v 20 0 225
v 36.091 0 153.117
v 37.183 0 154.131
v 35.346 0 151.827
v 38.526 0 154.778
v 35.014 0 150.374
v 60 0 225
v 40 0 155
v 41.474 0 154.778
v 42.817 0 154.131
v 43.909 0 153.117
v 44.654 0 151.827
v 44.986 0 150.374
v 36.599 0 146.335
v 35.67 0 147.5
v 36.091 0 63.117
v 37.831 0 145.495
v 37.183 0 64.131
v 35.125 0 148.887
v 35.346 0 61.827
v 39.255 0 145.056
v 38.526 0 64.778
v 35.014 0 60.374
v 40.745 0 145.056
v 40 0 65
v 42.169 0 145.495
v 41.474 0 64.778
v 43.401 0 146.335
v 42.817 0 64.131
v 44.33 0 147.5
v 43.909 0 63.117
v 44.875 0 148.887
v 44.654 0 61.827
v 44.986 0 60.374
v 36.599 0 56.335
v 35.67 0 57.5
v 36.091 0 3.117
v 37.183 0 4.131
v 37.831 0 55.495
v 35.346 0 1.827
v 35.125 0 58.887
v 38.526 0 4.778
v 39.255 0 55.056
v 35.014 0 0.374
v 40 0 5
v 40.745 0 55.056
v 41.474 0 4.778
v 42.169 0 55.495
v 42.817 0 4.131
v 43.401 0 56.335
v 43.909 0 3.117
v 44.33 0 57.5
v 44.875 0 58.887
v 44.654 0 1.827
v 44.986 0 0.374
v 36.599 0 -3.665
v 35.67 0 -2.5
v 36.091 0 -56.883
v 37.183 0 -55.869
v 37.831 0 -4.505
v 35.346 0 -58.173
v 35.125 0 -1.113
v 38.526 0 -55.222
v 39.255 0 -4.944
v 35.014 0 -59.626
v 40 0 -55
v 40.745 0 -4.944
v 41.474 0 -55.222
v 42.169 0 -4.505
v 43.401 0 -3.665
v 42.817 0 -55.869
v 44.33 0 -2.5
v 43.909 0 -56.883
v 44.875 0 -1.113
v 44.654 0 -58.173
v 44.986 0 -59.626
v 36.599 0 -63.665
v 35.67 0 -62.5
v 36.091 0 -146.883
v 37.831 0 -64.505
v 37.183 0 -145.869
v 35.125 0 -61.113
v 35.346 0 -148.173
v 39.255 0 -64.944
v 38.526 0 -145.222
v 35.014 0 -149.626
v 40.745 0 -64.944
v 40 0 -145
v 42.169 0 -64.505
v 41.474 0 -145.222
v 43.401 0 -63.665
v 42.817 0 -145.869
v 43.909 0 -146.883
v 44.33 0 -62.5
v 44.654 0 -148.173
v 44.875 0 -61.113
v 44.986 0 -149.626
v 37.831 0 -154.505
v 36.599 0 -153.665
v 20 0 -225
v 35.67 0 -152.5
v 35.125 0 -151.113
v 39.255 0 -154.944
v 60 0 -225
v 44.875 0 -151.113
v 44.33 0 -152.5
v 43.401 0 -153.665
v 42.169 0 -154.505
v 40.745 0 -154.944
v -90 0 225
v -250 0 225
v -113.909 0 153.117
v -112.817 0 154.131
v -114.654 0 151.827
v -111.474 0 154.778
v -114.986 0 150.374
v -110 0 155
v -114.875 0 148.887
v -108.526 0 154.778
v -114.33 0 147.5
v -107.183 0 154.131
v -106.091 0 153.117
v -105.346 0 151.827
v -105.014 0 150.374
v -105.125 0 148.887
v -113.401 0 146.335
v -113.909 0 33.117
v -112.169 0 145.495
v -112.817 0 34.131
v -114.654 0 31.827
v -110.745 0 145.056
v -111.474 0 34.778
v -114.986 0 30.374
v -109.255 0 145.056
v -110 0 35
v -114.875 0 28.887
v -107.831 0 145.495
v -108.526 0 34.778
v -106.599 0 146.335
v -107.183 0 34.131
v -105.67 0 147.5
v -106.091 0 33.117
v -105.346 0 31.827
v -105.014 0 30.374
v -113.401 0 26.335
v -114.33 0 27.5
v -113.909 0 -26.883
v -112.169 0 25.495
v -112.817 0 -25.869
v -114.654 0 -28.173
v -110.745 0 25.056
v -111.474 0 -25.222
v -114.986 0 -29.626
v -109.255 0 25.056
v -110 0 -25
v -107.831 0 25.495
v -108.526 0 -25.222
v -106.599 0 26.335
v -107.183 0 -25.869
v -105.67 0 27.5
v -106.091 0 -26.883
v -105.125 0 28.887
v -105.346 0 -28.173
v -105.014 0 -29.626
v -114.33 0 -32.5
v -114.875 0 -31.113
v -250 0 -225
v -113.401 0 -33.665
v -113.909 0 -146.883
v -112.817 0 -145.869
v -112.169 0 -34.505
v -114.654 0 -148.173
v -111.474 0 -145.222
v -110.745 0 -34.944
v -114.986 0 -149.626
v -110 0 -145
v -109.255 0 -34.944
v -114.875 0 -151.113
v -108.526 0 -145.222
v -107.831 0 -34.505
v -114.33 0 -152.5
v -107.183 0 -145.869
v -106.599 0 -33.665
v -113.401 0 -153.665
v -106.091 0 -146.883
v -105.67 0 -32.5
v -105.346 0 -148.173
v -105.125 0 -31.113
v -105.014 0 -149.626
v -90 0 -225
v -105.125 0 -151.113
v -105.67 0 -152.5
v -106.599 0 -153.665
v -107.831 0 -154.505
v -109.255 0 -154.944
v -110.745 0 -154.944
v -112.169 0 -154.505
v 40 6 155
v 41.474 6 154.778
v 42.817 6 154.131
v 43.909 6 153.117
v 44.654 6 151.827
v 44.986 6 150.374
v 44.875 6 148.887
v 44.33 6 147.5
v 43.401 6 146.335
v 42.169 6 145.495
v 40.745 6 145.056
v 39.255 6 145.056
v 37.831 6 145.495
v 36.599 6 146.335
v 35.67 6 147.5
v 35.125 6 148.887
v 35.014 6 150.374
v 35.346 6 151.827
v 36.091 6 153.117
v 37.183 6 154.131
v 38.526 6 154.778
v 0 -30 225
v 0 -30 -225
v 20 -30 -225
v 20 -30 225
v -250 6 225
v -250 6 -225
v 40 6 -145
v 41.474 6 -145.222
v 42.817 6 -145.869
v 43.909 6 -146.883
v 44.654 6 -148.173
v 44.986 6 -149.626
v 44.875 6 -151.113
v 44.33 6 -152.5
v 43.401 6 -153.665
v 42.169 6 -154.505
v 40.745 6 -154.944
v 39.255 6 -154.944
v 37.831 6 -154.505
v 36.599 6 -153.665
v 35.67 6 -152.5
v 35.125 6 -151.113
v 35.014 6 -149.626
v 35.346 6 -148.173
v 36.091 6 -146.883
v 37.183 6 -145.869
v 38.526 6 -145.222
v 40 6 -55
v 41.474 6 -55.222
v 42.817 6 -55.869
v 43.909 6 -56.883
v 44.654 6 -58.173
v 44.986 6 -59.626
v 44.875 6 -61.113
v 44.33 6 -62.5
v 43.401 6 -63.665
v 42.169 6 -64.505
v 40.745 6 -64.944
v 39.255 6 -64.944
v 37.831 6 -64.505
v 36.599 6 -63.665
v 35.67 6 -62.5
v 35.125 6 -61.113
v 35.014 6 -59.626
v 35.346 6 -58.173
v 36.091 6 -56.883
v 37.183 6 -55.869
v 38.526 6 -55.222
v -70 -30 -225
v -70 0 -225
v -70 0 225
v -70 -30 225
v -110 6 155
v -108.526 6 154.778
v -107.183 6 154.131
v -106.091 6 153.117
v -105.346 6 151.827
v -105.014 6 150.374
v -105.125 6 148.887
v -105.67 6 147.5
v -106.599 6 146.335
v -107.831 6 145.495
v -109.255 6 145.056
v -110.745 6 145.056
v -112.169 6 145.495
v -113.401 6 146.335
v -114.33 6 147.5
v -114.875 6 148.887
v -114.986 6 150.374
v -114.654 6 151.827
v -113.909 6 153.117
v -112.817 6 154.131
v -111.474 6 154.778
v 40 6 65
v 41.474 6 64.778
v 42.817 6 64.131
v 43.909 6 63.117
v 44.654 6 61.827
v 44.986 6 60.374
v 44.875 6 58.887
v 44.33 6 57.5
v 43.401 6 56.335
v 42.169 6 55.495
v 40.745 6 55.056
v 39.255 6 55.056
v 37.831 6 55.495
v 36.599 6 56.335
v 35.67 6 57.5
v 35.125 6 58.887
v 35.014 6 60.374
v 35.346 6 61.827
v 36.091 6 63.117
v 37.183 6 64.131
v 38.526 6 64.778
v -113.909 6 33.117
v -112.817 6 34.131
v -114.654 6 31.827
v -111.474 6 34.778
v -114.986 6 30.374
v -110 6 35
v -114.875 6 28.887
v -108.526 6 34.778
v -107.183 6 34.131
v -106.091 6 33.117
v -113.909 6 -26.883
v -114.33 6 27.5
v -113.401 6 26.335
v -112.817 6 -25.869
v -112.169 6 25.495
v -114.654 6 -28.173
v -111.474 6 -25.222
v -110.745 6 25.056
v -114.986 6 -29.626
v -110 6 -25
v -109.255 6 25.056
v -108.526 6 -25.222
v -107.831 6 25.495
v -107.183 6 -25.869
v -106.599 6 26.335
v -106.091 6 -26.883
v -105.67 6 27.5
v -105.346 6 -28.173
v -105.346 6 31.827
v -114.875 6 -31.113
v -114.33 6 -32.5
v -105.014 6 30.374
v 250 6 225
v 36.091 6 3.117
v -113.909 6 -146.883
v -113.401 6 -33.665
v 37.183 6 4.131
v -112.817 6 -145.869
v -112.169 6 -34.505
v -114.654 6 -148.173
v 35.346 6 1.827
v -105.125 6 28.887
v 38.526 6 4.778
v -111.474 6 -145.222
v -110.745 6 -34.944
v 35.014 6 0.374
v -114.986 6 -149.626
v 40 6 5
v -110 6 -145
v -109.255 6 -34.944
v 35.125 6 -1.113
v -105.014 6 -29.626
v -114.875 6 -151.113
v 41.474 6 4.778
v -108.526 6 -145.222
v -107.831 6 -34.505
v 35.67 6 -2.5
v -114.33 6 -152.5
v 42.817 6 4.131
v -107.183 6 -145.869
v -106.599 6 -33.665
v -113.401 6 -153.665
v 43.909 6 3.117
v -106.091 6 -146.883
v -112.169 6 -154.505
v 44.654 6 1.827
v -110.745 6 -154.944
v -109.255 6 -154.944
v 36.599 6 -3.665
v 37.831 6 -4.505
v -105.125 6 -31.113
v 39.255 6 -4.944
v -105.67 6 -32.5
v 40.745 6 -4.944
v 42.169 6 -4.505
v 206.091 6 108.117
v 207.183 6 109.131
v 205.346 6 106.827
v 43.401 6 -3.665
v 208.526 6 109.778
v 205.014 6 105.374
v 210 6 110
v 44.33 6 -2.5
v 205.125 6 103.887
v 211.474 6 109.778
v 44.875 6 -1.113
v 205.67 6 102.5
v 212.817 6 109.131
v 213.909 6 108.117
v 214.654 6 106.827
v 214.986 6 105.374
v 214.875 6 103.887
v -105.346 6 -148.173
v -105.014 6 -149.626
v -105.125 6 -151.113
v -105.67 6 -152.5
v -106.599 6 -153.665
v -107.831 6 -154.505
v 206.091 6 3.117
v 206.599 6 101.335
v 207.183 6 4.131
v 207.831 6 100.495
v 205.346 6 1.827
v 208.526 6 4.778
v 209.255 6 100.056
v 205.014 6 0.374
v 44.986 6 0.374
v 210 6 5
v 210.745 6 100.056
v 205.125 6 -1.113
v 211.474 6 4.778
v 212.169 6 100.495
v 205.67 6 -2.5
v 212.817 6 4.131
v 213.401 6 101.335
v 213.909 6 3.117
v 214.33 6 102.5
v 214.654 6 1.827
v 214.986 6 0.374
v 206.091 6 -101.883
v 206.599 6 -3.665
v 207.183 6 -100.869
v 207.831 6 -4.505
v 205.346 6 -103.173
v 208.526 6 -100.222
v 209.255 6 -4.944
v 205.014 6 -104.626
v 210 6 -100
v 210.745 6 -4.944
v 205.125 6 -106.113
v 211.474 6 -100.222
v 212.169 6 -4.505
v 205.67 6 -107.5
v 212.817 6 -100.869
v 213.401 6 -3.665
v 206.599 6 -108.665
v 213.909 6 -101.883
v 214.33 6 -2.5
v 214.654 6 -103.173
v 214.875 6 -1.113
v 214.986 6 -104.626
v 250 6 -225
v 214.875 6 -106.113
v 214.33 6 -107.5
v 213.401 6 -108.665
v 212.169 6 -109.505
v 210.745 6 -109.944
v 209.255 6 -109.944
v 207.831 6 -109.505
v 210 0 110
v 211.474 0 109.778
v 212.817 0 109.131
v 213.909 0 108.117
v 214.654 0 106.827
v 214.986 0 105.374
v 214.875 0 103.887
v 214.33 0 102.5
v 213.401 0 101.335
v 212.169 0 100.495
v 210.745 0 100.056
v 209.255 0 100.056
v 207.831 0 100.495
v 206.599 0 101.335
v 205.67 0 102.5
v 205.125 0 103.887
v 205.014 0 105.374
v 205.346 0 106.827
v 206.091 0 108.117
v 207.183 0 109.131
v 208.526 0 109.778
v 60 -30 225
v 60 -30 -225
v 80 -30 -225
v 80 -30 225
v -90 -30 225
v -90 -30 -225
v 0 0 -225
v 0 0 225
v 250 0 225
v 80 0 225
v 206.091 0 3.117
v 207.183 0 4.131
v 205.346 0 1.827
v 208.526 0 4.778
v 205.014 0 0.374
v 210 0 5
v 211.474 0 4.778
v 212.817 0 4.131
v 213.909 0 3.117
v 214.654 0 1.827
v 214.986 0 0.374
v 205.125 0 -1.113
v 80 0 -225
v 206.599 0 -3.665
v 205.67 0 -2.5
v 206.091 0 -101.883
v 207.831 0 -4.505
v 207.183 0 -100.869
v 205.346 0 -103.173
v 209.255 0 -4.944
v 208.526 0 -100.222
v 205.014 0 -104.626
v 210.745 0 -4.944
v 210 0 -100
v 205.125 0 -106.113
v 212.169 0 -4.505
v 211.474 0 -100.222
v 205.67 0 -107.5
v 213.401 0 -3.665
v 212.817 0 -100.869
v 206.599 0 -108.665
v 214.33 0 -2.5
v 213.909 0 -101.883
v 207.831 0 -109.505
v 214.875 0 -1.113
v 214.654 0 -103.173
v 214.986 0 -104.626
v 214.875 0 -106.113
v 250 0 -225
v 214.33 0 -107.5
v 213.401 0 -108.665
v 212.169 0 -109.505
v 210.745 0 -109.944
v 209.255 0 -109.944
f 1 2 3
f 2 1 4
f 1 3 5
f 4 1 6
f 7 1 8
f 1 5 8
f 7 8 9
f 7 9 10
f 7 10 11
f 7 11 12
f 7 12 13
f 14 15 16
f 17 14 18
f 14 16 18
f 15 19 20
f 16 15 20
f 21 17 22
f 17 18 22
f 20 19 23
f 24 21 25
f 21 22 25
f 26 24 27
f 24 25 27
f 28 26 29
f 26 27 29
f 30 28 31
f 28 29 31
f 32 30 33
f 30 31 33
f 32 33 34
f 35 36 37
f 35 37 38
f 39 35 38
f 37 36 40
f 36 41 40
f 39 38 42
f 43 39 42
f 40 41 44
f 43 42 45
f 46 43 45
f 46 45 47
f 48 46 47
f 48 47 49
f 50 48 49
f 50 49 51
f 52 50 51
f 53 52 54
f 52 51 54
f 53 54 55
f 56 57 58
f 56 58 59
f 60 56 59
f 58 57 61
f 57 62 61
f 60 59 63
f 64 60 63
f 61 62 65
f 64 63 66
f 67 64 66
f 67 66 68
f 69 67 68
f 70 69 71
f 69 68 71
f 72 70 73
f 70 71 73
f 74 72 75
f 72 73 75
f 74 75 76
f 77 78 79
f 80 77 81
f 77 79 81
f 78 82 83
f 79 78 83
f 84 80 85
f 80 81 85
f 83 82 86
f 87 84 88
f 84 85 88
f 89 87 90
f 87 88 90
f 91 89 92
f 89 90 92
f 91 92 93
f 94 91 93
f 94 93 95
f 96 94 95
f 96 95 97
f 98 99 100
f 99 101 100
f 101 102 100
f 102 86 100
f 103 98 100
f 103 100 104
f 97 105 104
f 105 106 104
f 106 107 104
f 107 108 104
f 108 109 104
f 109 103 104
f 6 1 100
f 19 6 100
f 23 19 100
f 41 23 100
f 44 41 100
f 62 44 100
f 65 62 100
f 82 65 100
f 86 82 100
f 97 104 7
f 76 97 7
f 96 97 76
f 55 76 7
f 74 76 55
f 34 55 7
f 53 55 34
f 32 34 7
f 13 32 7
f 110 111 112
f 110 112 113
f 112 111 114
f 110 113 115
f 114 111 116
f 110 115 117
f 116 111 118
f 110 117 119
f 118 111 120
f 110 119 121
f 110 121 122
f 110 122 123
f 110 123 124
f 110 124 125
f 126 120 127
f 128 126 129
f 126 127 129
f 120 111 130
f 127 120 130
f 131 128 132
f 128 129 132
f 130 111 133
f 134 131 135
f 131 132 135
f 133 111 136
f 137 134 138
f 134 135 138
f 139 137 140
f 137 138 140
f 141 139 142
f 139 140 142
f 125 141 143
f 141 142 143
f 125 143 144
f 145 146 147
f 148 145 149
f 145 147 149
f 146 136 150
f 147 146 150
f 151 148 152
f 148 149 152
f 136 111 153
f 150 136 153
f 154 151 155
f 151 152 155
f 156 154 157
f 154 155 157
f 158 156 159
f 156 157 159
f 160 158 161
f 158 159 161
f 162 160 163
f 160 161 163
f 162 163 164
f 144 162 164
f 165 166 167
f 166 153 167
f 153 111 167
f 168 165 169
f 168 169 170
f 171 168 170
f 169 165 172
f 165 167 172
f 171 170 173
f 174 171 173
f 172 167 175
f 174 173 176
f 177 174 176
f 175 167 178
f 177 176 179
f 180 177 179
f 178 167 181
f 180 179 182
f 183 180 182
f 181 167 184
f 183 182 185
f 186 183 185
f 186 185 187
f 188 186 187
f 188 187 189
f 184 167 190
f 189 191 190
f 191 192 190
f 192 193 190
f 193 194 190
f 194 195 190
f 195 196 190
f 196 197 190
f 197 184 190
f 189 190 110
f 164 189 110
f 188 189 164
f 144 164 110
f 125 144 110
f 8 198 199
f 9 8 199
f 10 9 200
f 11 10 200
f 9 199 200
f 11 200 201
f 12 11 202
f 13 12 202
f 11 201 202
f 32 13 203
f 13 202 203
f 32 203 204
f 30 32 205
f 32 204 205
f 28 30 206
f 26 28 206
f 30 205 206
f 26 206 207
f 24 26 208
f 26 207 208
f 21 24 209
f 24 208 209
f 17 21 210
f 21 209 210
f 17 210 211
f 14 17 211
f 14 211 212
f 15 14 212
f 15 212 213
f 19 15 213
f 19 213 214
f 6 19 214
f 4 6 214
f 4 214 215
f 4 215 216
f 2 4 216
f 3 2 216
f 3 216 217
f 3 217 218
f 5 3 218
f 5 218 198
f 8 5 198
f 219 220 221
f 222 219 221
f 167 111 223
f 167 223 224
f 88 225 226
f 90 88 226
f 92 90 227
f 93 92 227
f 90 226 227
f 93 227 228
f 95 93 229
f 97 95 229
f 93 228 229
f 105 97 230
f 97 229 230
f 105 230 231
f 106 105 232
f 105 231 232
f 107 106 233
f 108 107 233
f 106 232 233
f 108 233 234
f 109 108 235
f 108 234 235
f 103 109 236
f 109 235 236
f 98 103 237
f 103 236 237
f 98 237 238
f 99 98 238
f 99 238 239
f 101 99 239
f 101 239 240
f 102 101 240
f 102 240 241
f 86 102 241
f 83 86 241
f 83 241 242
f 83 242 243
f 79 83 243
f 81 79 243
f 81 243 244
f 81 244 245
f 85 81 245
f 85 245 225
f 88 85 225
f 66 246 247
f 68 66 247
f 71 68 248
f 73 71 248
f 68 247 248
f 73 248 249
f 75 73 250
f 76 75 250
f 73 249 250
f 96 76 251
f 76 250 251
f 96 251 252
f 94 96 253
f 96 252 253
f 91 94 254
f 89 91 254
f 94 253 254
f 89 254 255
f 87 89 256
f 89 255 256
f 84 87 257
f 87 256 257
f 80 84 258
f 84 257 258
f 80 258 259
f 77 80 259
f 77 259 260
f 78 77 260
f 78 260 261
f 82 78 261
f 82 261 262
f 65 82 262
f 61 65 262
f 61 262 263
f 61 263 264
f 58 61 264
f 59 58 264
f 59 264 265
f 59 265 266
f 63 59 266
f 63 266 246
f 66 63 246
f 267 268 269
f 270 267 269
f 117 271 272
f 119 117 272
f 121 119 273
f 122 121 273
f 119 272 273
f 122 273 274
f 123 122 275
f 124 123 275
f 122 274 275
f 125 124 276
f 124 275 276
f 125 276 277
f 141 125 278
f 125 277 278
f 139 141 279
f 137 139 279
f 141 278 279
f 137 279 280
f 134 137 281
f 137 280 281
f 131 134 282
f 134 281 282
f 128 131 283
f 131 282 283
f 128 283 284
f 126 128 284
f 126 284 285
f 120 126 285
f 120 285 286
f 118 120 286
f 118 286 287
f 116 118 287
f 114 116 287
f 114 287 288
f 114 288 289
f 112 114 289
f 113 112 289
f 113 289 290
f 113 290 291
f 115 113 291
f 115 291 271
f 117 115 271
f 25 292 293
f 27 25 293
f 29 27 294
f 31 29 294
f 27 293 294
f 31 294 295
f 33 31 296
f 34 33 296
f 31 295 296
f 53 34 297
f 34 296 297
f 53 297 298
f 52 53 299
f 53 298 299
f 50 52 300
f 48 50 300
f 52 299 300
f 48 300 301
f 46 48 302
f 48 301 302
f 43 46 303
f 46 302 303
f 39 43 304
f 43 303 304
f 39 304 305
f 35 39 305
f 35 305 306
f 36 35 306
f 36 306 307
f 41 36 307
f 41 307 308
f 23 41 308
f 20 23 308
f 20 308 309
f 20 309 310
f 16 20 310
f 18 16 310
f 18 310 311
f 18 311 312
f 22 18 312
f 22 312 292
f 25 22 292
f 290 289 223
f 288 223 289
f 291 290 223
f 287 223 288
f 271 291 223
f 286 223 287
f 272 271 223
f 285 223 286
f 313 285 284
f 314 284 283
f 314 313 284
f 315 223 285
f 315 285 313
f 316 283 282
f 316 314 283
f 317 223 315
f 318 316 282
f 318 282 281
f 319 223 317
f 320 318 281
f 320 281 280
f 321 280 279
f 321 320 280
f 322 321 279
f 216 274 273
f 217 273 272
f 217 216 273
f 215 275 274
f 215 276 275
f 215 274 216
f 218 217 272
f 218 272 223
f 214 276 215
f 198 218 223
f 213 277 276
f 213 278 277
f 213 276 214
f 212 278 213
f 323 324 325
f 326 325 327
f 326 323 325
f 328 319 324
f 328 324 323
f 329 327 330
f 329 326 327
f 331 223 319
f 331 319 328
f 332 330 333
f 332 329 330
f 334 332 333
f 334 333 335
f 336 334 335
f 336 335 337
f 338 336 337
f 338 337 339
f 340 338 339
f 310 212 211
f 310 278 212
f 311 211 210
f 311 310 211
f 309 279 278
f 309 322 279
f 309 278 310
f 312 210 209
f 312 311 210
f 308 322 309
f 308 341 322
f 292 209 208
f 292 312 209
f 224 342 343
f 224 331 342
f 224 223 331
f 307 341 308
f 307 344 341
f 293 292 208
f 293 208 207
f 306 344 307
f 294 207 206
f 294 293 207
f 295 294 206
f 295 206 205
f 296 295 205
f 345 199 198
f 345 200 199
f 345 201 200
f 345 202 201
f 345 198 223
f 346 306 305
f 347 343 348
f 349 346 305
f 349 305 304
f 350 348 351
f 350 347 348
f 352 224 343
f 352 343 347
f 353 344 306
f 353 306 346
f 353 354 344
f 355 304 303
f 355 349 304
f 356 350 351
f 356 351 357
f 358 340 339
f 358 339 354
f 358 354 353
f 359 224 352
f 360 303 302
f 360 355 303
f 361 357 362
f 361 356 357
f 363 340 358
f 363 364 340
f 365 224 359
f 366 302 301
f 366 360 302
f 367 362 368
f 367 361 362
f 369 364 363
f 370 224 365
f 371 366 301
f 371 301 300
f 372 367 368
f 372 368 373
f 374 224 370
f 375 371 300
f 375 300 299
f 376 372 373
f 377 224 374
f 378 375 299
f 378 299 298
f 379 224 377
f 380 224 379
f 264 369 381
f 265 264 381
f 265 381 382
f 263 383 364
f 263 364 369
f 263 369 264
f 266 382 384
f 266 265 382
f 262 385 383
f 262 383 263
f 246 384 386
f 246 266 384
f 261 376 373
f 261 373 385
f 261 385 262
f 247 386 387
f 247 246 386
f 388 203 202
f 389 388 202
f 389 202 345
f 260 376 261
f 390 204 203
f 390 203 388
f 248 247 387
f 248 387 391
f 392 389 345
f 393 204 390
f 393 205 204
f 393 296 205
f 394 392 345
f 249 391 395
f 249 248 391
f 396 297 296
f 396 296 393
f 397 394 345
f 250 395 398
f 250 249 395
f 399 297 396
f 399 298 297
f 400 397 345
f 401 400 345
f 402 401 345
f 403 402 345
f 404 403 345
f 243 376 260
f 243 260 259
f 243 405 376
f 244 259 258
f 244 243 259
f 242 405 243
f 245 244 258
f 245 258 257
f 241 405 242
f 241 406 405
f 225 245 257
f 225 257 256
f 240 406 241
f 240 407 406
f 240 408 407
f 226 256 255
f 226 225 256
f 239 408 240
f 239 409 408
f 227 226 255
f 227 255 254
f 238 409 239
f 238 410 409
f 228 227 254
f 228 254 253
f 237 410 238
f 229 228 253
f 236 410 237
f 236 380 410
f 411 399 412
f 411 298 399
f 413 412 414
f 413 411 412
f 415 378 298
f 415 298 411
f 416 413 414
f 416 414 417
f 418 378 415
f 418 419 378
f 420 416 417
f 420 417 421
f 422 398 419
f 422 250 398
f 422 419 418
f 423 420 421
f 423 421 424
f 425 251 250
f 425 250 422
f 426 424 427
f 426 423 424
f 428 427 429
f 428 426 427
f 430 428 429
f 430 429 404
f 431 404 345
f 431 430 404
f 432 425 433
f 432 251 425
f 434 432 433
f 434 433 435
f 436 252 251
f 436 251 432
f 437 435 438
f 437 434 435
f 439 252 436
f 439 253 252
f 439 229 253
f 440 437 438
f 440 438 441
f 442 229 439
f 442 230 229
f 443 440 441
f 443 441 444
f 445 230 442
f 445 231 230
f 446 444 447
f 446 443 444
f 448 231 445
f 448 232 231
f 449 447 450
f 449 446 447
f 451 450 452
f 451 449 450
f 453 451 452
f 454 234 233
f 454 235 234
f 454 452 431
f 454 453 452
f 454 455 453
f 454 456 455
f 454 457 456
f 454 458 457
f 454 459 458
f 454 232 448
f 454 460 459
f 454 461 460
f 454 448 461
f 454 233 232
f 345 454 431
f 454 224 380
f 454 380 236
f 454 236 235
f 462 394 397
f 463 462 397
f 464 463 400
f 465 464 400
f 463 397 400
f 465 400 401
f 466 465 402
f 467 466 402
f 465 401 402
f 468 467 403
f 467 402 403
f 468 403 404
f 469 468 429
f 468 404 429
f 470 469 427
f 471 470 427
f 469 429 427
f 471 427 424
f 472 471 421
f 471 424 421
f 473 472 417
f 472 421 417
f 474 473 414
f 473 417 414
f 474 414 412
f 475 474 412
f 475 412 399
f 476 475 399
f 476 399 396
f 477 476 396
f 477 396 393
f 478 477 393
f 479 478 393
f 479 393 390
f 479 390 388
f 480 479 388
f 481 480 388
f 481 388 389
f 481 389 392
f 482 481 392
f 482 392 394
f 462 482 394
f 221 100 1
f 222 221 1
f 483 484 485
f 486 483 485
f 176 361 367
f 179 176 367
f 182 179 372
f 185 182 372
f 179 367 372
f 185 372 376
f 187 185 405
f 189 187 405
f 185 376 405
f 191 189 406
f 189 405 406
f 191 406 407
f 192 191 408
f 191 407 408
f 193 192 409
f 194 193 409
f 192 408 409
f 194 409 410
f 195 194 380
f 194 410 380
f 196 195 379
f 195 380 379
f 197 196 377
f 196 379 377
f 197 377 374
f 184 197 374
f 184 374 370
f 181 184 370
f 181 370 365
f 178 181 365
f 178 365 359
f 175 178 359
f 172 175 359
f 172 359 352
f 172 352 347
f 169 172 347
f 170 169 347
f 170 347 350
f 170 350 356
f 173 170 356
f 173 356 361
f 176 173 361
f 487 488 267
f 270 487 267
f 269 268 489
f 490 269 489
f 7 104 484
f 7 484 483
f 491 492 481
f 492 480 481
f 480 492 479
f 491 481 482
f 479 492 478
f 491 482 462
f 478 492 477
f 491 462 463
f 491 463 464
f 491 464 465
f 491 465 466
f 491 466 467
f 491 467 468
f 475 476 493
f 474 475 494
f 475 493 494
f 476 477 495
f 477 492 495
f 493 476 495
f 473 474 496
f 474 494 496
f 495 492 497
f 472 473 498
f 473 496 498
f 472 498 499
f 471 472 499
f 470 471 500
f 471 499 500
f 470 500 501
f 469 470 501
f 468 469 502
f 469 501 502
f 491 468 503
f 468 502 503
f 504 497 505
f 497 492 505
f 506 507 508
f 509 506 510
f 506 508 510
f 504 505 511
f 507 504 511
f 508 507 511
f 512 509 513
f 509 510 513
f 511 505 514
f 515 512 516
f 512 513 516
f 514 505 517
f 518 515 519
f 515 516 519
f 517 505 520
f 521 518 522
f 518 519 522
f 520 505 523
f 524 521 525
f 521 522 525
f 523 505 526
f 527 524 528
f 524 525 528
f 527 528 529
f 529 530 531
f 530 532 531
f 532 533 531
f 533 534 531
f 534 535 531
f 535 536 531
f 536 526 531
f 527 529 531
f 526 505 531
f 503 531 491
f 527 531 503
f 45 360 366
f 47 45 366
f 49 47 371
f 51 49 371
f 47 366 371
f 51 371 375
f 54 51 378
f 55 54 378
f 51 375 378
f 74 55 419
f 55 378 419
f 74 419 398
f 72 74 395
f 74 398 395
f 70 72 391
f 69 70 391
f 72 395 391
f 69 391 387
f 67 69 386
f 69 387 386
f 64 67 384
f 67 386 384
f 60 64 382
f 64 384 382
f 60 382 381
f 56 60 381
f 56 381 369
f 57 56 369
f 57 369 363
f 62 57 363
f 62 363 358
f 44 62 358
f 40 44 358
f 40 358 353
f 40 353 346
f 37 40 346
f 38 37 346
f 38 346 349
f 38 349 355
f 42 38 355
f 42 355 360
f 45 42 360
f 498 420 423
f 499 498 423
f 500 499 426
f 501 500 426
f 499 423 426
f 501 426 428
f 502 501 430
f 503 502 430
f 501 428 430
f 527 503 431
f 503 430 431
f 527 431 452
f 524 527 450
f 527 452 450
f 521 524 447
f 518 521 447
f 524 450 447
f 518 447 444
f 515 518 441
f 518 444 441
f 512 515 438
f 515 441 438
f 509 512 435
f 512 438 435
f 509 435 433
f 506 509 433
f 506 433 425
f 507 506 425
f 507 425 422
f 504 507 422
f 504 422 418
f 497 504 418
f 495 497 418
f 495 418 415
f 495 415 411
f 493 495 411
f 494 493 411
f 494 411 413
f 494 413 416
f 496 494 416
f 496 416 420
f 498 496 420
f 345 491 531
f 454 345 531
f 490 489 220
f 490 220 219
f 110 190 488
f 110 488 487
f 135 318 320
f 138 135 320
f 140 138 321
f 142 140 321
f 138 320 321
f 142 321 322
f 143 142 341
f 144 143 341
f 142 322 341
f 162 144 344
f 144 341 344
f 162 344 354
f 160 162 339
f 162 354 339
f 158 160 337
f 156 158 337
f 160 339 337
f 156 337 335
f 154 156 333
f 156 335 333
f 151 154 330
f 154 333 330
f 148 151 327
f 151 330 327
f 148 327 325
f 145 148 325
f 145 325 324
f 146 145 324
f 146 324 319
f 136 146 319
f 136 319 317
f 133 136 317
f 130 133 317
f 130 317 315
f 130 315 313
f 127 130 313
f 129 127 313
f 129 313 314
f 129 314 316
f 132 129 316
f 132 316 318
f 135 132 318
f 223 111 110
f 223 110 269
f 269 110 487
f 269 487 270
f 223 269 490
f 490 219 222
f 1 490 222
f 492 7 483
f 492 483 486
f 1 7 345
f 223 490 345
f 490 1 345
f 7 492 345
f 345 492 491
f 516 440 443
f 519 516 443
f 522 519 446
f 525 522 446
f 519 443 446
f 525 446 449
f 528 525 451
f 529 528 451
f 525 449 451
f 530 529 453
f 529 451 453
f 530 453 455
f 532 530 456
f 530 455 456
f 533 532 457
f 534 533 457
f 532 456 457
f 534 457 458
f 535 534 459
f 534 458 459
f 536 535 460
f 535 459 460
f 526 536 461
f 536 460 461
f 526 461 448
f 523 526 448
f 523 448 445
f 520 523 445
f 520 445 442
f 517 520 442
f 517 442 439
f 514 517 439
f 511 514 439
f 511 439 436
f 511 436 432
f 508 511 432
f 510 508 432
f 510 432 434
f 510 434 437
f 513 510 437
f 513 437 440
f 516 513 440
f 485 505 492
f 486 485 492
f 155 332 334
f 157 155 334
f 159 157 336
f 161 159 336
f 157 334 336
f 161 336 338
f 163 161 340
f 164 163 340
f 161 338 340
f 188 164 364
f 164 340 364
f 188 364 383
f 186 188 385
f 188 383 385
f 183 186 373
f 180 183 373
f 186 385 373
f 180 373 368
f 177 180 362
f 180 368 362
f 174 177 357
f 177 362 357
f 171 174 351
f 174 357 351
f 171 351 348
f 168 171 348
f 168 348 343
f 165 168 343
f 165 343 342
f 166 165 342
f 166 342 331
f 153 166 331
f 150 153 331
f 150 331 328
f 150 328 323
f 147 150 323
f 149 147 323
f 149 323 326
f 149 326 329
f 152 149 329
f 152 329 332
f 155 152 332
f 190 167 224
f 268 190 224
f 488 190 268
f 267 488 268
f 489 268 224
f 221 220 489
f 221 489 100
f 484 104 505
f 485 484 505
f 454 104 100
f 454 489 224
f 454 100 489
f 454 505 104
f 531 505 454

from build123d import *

# Parameters (mm, degrees)
SKETCH1_W           = 500
SKETCH1_H           = 450
BOSS_EXTRUDE1_DEPTH = 6
CUT_EXTRUDE1_REACH  = 338.394
SKETCH2_R           = 5
SKETCH3_W           = 20
SKETCH3_H           = 450
BOSS_EXTRUDE2_DEPTH = 30


with BuildPart() as part:
    # Sketch1 → Boss-Extrude1 (new body)
    with BuildSketch(Plane(origin=(0, 0, 0), x_dir=(1, 0, 0), z_dir=(0, 1, 0))):
        Rectangle(SKETCH1_W, SKETCH1_H)
    extrude(amount=BOSS_EXTRUDE1_DEPTH)

    # Sketch2 → Cut-Extrude1 (cut, up to next)
    with BuildSketch(Plane(origin=(0, 6, 0), x_dir=(1, 0, 0), z_dir=(0, 1, 0)), mode=Mode.PRIVATE) as cut_extrude1_sk1:
        with Locations(Location((210, 105, 0), (0, 0, 270))):
            Circle(SKETCH2_R)
    cut_extrude1_tool1 = extrude(cut_extrude1_sk1.sketch, amount=-CUT_EXTRUDE1_REACH, mode=Mode.PRIVATE) & part.part
    # Sketch2 → Cut-Extrude1 (cut, up to next)
    with BuildSketch(Plane(origin=(0, 6, 0), x_dir=(1, 0, 0), z_dir=(0, 1, 0)), mode=Mode.PRIVATE) as cut_extrude1_sk2:
        with Locations(Location((210, -105, 0), (0, 0, 270))):
            Circle(SKETCH2_R)
    cut_extrude1_tool2 = extrude(cut_extrude1_sk2.sketch, amount=-CUT_EXTRUDE1_REACH, mode=Mode.PRIVATE) & part.part
    # Sketch2 → Cut-Extrude1 (cut, up to next)
    with BuildSketch(Plane(origin=(0, 6, 0), x_dir=(1, 0, 0), z_dir=(0, 1, 0)), mode=Mode.PRIVATE) as cut_extrude1_sk3:
        with Locations(Location((210, 0, 0), (0, 0, 270))):
            Circle(SKETCH2_R)
    cut_extrude1_tool3 = extrude(cut_extrude1_sk3.sketch, amount=-CUT_EXTRUDE1_REACH, mode=Mode.PRIVATE) & part.part
    # Sketch2 → Cut-Extrude1 (cut, up to next)
    with BuildSketch(Plane(origin=(0, 6, 0), x_dir=(1, 0, 0), z_dir=(0, 1, 0)), mode=Mode.PRIVATE) as cut_extrude1_sk4:
        with Locations(Location((40, 150, 0), (0, 0, 270))):
            Circle(SKETCH2_R)
    cut_extrude1_tool4 = extrude(cut_extrude1_sk4.sketch, amount=-CUT_EXTRUDE1_REACH, mode=Mode.PRIVATE) & part.part
    # Sketch2 → Cut-Extrude1 (cut, up to next)
    with BuildSketch(Plane(origin=(0, 6, 0), x_dir=(1, 0, 0), z_dir=(0, 1, 0)), mode=Mode.PRIVATE) as cut_extrude1_sk5:
        with Locations(Location((40, 60, 0), (0, 0, 270))):
            Circle(SKETCH2_R)
    cut_extrude1_tool5 = extrude(cut_extrude1_sk5.sketch, amount=-CUT_EXTRUDE1_REACH, mode=Mode.PRIVATE) & part.part
    # Sketch2 → Cut-Extrude1 (cut, up to next)
    with BuildSketch(Plane(origin=(0, 6, 0), x_dir=(1, 0, 0), z_dir=(0, 1, 0)), mode=Mode.PRIVATE) as cut_extrude1_sk6:
        with Locations(Location((40, 0, 0), (0, 0, 270))):
            Circle(SKETCH2_R)
    cut_extrude1_tool6 = extrude(cut_extrude1_sk6.sketch, amount=-CUT_EXTRUDE1_REACH, mode=Mode.PRIVATE) & part.part
    # Sketch2 → Cut-Extrude1 (cut, up to next)
    with BuildSketch(Plane(origin=(0, 6, 0), x_dir=(1, 0, 0), z_dir=(0, 1, 0)), mode=Mode.PRIVATE) as cut_extrude1_sk7:
        with Locations(Location((-110, 150, 0), (0, 0, 270))):
            Circle(SKETCH2_R)
    cut_extrude1_tool7 = extrude(cut_extrude1_sk7.sketch, amount=-CUT_EXTRUDE1_REACH, mode=Mode.PRIVATE) & part.part
    # Sketch2 → Cut-Extrude1 (cut, up to next)
    with BuildSketch(Plane(origin=(0, 6, 0), x_dir=(1, 0, 0), z_dir=(0, 1, 0)), mode=Mode.PRIVATE) as cut_extrude1_sk8:
        with Locations(Location((-110, 30, 0), (0, 0, 270))):
            Circle(SKETCH2_R)
    cut_extrude1_tool8 = extrude(cut_extrude1_sk8.sketch, amount=-CUT_EXTRUDE1_REACH, mode=Mode.PRIVATE) & part.part
    # Sketch2 → Cut-Extrude1 (cut, up to next)
    with BuildSketch(Plane(origin=(0, 6, 0), x_dir=(1, 0, 0), z_dir=(0, 1, 0)), mode=Mode.PRIVATE) as cut_extrude1_sk9:
        with Locations(Location((-110, -30, 0), (0, 0, 270))):
            Circle(SKETCH2_R)
    cut_extrude1_tool9 = extrude(cut_extrude1_sk9.sketch, amount=-CUT_EXTRUDE1_REACH, mode=Mode.PRIVATE) & part.part
    # Sketch2 → Cut-Extrude1 (cut, up to next)
    with BuildSketch(Plane(origin=(0, 6, 0), x_dir=(1, 0, 0), z_dir=(0, 1, 0)), mode=Mode.PRIVATE) as cut_extrude1_sk10:
        with Locations(Location((40, -60, 0), (0, 0, 270))):
            Circle(SKETCH2_R)
    cut_extrude1_tool10 = extrude(cut_extrude1_sk10.sketch, amount=-CUT_EXTRUDE1_REACH, mode=Mode.PRIVATE) & part.part
    # Sketch2 → Cut-Extrude1 (cut, up to next)
    with BuildSketch(Plane(origin=(0, 6, 0), x_dir=(1, 0, 0), z_dir=(0, 1, 0)), mode=Mode.PRIVATE) as cut_extrude1_sk11:
        with Locations(Location((40, -150, 0), (0, 0, 270))):
            Circle(SKETCH2_R)
    cut_extrude1_tool11 = extrude(cut_extrude1_sk11.sketch, amount=-CUT_EXTRUDE1_REACH, mode=Mode.PRIVATE) & part.part
    # Sketch2 → Cut-Extrude1 (cut, up to next)
    with BuildSketch(Plane(origin=(0, 6, 0), x_dir=(1, 0, 0), z_dir=(0, 1, 0)), mode=Mode.PRIVATE) as cut_extrude1_sk12:
        with Locations(Location((-110, -150, 0), (0, 0, 270))):
            Circle(SKETCH2_R)
    cut_extrude1_tool12 = extrude(cut_extrude1_sk12.sketch, amount=-CUT_EXTRUDE1_REACH, mode=Mode.PRIVATE) & part.part
    add(cut_extrude1_tool1.solids().sort_by_distance((210, 6, -105))[0], mode=Mode.SUBTRACT)
    add(cut_extrude1_tool2.solids().sort_by_distance((210, 6, 105))[0], mode=Mode.SUBTRACT)
    add(cut_extrude1_tool3.solids().sort_by_distance((210, 6, 0))[0], mode=Mode.SUBTRACT)
    add(cut_extrude1_tool4.solids().sort_by_distance((40, 6, -150))[0], mode=Mode.SUBTRACT)
    add(cut_extrude1_tool5.solids().sort_by_distance((40, 6, -60))[0], mode=Mode.SUBTRACT)
    add(cut_extrude1_tool6.solids().sort_by_distance((40, 6, 0))[0], mode=Mode.SUBTRACT)
    add(cut_extrude1_tool7.solids().sort_by_distance((-110, 6, -150))[0], mode=Mode.SUBTRACT)
    add(cut_extrude1_tool8.solids().sort_by_distance((-110, 6, -30))[0], mode=Mode.SUBTRACT)
    add(cut_extrude1_tool9.solids().sort_by_distance((-110, 6, 30))[0], mode=Mode.SUBTRACT)
    add(cut_extrude1_tool10.solids().sort_by_distance((40, 6, 60))[0], mode=Mode.SUBTRACT)
    add(cut_extrude1_tool11.solids().sort_by_distance((40, 6, 150))[0], mode=Mode.SUBTRACT)
    add(cut_extrude1_tool12.solids().sort_by_distance((-110, 6, 150))[0], mode=Mode.SUBTRACT)

    # Sketch3 → Boss-Extrude2 (add)
    with BuildSketch(Plane.XZ):
        with Locations((10, 0)):
            Rectangle(SKETCH3_W, SKETCH3_H)
        with Locations((-80, 0)):
            Rectangle(SKETCH3_W, SKETCH3_H)
        with Locations((70, 0)):
            Rectangle(SKETCH3_W, SKETCH3_H)
    extrude(amount=BOSS_EXTRUDE2_DEPTH)


solid = part.part
